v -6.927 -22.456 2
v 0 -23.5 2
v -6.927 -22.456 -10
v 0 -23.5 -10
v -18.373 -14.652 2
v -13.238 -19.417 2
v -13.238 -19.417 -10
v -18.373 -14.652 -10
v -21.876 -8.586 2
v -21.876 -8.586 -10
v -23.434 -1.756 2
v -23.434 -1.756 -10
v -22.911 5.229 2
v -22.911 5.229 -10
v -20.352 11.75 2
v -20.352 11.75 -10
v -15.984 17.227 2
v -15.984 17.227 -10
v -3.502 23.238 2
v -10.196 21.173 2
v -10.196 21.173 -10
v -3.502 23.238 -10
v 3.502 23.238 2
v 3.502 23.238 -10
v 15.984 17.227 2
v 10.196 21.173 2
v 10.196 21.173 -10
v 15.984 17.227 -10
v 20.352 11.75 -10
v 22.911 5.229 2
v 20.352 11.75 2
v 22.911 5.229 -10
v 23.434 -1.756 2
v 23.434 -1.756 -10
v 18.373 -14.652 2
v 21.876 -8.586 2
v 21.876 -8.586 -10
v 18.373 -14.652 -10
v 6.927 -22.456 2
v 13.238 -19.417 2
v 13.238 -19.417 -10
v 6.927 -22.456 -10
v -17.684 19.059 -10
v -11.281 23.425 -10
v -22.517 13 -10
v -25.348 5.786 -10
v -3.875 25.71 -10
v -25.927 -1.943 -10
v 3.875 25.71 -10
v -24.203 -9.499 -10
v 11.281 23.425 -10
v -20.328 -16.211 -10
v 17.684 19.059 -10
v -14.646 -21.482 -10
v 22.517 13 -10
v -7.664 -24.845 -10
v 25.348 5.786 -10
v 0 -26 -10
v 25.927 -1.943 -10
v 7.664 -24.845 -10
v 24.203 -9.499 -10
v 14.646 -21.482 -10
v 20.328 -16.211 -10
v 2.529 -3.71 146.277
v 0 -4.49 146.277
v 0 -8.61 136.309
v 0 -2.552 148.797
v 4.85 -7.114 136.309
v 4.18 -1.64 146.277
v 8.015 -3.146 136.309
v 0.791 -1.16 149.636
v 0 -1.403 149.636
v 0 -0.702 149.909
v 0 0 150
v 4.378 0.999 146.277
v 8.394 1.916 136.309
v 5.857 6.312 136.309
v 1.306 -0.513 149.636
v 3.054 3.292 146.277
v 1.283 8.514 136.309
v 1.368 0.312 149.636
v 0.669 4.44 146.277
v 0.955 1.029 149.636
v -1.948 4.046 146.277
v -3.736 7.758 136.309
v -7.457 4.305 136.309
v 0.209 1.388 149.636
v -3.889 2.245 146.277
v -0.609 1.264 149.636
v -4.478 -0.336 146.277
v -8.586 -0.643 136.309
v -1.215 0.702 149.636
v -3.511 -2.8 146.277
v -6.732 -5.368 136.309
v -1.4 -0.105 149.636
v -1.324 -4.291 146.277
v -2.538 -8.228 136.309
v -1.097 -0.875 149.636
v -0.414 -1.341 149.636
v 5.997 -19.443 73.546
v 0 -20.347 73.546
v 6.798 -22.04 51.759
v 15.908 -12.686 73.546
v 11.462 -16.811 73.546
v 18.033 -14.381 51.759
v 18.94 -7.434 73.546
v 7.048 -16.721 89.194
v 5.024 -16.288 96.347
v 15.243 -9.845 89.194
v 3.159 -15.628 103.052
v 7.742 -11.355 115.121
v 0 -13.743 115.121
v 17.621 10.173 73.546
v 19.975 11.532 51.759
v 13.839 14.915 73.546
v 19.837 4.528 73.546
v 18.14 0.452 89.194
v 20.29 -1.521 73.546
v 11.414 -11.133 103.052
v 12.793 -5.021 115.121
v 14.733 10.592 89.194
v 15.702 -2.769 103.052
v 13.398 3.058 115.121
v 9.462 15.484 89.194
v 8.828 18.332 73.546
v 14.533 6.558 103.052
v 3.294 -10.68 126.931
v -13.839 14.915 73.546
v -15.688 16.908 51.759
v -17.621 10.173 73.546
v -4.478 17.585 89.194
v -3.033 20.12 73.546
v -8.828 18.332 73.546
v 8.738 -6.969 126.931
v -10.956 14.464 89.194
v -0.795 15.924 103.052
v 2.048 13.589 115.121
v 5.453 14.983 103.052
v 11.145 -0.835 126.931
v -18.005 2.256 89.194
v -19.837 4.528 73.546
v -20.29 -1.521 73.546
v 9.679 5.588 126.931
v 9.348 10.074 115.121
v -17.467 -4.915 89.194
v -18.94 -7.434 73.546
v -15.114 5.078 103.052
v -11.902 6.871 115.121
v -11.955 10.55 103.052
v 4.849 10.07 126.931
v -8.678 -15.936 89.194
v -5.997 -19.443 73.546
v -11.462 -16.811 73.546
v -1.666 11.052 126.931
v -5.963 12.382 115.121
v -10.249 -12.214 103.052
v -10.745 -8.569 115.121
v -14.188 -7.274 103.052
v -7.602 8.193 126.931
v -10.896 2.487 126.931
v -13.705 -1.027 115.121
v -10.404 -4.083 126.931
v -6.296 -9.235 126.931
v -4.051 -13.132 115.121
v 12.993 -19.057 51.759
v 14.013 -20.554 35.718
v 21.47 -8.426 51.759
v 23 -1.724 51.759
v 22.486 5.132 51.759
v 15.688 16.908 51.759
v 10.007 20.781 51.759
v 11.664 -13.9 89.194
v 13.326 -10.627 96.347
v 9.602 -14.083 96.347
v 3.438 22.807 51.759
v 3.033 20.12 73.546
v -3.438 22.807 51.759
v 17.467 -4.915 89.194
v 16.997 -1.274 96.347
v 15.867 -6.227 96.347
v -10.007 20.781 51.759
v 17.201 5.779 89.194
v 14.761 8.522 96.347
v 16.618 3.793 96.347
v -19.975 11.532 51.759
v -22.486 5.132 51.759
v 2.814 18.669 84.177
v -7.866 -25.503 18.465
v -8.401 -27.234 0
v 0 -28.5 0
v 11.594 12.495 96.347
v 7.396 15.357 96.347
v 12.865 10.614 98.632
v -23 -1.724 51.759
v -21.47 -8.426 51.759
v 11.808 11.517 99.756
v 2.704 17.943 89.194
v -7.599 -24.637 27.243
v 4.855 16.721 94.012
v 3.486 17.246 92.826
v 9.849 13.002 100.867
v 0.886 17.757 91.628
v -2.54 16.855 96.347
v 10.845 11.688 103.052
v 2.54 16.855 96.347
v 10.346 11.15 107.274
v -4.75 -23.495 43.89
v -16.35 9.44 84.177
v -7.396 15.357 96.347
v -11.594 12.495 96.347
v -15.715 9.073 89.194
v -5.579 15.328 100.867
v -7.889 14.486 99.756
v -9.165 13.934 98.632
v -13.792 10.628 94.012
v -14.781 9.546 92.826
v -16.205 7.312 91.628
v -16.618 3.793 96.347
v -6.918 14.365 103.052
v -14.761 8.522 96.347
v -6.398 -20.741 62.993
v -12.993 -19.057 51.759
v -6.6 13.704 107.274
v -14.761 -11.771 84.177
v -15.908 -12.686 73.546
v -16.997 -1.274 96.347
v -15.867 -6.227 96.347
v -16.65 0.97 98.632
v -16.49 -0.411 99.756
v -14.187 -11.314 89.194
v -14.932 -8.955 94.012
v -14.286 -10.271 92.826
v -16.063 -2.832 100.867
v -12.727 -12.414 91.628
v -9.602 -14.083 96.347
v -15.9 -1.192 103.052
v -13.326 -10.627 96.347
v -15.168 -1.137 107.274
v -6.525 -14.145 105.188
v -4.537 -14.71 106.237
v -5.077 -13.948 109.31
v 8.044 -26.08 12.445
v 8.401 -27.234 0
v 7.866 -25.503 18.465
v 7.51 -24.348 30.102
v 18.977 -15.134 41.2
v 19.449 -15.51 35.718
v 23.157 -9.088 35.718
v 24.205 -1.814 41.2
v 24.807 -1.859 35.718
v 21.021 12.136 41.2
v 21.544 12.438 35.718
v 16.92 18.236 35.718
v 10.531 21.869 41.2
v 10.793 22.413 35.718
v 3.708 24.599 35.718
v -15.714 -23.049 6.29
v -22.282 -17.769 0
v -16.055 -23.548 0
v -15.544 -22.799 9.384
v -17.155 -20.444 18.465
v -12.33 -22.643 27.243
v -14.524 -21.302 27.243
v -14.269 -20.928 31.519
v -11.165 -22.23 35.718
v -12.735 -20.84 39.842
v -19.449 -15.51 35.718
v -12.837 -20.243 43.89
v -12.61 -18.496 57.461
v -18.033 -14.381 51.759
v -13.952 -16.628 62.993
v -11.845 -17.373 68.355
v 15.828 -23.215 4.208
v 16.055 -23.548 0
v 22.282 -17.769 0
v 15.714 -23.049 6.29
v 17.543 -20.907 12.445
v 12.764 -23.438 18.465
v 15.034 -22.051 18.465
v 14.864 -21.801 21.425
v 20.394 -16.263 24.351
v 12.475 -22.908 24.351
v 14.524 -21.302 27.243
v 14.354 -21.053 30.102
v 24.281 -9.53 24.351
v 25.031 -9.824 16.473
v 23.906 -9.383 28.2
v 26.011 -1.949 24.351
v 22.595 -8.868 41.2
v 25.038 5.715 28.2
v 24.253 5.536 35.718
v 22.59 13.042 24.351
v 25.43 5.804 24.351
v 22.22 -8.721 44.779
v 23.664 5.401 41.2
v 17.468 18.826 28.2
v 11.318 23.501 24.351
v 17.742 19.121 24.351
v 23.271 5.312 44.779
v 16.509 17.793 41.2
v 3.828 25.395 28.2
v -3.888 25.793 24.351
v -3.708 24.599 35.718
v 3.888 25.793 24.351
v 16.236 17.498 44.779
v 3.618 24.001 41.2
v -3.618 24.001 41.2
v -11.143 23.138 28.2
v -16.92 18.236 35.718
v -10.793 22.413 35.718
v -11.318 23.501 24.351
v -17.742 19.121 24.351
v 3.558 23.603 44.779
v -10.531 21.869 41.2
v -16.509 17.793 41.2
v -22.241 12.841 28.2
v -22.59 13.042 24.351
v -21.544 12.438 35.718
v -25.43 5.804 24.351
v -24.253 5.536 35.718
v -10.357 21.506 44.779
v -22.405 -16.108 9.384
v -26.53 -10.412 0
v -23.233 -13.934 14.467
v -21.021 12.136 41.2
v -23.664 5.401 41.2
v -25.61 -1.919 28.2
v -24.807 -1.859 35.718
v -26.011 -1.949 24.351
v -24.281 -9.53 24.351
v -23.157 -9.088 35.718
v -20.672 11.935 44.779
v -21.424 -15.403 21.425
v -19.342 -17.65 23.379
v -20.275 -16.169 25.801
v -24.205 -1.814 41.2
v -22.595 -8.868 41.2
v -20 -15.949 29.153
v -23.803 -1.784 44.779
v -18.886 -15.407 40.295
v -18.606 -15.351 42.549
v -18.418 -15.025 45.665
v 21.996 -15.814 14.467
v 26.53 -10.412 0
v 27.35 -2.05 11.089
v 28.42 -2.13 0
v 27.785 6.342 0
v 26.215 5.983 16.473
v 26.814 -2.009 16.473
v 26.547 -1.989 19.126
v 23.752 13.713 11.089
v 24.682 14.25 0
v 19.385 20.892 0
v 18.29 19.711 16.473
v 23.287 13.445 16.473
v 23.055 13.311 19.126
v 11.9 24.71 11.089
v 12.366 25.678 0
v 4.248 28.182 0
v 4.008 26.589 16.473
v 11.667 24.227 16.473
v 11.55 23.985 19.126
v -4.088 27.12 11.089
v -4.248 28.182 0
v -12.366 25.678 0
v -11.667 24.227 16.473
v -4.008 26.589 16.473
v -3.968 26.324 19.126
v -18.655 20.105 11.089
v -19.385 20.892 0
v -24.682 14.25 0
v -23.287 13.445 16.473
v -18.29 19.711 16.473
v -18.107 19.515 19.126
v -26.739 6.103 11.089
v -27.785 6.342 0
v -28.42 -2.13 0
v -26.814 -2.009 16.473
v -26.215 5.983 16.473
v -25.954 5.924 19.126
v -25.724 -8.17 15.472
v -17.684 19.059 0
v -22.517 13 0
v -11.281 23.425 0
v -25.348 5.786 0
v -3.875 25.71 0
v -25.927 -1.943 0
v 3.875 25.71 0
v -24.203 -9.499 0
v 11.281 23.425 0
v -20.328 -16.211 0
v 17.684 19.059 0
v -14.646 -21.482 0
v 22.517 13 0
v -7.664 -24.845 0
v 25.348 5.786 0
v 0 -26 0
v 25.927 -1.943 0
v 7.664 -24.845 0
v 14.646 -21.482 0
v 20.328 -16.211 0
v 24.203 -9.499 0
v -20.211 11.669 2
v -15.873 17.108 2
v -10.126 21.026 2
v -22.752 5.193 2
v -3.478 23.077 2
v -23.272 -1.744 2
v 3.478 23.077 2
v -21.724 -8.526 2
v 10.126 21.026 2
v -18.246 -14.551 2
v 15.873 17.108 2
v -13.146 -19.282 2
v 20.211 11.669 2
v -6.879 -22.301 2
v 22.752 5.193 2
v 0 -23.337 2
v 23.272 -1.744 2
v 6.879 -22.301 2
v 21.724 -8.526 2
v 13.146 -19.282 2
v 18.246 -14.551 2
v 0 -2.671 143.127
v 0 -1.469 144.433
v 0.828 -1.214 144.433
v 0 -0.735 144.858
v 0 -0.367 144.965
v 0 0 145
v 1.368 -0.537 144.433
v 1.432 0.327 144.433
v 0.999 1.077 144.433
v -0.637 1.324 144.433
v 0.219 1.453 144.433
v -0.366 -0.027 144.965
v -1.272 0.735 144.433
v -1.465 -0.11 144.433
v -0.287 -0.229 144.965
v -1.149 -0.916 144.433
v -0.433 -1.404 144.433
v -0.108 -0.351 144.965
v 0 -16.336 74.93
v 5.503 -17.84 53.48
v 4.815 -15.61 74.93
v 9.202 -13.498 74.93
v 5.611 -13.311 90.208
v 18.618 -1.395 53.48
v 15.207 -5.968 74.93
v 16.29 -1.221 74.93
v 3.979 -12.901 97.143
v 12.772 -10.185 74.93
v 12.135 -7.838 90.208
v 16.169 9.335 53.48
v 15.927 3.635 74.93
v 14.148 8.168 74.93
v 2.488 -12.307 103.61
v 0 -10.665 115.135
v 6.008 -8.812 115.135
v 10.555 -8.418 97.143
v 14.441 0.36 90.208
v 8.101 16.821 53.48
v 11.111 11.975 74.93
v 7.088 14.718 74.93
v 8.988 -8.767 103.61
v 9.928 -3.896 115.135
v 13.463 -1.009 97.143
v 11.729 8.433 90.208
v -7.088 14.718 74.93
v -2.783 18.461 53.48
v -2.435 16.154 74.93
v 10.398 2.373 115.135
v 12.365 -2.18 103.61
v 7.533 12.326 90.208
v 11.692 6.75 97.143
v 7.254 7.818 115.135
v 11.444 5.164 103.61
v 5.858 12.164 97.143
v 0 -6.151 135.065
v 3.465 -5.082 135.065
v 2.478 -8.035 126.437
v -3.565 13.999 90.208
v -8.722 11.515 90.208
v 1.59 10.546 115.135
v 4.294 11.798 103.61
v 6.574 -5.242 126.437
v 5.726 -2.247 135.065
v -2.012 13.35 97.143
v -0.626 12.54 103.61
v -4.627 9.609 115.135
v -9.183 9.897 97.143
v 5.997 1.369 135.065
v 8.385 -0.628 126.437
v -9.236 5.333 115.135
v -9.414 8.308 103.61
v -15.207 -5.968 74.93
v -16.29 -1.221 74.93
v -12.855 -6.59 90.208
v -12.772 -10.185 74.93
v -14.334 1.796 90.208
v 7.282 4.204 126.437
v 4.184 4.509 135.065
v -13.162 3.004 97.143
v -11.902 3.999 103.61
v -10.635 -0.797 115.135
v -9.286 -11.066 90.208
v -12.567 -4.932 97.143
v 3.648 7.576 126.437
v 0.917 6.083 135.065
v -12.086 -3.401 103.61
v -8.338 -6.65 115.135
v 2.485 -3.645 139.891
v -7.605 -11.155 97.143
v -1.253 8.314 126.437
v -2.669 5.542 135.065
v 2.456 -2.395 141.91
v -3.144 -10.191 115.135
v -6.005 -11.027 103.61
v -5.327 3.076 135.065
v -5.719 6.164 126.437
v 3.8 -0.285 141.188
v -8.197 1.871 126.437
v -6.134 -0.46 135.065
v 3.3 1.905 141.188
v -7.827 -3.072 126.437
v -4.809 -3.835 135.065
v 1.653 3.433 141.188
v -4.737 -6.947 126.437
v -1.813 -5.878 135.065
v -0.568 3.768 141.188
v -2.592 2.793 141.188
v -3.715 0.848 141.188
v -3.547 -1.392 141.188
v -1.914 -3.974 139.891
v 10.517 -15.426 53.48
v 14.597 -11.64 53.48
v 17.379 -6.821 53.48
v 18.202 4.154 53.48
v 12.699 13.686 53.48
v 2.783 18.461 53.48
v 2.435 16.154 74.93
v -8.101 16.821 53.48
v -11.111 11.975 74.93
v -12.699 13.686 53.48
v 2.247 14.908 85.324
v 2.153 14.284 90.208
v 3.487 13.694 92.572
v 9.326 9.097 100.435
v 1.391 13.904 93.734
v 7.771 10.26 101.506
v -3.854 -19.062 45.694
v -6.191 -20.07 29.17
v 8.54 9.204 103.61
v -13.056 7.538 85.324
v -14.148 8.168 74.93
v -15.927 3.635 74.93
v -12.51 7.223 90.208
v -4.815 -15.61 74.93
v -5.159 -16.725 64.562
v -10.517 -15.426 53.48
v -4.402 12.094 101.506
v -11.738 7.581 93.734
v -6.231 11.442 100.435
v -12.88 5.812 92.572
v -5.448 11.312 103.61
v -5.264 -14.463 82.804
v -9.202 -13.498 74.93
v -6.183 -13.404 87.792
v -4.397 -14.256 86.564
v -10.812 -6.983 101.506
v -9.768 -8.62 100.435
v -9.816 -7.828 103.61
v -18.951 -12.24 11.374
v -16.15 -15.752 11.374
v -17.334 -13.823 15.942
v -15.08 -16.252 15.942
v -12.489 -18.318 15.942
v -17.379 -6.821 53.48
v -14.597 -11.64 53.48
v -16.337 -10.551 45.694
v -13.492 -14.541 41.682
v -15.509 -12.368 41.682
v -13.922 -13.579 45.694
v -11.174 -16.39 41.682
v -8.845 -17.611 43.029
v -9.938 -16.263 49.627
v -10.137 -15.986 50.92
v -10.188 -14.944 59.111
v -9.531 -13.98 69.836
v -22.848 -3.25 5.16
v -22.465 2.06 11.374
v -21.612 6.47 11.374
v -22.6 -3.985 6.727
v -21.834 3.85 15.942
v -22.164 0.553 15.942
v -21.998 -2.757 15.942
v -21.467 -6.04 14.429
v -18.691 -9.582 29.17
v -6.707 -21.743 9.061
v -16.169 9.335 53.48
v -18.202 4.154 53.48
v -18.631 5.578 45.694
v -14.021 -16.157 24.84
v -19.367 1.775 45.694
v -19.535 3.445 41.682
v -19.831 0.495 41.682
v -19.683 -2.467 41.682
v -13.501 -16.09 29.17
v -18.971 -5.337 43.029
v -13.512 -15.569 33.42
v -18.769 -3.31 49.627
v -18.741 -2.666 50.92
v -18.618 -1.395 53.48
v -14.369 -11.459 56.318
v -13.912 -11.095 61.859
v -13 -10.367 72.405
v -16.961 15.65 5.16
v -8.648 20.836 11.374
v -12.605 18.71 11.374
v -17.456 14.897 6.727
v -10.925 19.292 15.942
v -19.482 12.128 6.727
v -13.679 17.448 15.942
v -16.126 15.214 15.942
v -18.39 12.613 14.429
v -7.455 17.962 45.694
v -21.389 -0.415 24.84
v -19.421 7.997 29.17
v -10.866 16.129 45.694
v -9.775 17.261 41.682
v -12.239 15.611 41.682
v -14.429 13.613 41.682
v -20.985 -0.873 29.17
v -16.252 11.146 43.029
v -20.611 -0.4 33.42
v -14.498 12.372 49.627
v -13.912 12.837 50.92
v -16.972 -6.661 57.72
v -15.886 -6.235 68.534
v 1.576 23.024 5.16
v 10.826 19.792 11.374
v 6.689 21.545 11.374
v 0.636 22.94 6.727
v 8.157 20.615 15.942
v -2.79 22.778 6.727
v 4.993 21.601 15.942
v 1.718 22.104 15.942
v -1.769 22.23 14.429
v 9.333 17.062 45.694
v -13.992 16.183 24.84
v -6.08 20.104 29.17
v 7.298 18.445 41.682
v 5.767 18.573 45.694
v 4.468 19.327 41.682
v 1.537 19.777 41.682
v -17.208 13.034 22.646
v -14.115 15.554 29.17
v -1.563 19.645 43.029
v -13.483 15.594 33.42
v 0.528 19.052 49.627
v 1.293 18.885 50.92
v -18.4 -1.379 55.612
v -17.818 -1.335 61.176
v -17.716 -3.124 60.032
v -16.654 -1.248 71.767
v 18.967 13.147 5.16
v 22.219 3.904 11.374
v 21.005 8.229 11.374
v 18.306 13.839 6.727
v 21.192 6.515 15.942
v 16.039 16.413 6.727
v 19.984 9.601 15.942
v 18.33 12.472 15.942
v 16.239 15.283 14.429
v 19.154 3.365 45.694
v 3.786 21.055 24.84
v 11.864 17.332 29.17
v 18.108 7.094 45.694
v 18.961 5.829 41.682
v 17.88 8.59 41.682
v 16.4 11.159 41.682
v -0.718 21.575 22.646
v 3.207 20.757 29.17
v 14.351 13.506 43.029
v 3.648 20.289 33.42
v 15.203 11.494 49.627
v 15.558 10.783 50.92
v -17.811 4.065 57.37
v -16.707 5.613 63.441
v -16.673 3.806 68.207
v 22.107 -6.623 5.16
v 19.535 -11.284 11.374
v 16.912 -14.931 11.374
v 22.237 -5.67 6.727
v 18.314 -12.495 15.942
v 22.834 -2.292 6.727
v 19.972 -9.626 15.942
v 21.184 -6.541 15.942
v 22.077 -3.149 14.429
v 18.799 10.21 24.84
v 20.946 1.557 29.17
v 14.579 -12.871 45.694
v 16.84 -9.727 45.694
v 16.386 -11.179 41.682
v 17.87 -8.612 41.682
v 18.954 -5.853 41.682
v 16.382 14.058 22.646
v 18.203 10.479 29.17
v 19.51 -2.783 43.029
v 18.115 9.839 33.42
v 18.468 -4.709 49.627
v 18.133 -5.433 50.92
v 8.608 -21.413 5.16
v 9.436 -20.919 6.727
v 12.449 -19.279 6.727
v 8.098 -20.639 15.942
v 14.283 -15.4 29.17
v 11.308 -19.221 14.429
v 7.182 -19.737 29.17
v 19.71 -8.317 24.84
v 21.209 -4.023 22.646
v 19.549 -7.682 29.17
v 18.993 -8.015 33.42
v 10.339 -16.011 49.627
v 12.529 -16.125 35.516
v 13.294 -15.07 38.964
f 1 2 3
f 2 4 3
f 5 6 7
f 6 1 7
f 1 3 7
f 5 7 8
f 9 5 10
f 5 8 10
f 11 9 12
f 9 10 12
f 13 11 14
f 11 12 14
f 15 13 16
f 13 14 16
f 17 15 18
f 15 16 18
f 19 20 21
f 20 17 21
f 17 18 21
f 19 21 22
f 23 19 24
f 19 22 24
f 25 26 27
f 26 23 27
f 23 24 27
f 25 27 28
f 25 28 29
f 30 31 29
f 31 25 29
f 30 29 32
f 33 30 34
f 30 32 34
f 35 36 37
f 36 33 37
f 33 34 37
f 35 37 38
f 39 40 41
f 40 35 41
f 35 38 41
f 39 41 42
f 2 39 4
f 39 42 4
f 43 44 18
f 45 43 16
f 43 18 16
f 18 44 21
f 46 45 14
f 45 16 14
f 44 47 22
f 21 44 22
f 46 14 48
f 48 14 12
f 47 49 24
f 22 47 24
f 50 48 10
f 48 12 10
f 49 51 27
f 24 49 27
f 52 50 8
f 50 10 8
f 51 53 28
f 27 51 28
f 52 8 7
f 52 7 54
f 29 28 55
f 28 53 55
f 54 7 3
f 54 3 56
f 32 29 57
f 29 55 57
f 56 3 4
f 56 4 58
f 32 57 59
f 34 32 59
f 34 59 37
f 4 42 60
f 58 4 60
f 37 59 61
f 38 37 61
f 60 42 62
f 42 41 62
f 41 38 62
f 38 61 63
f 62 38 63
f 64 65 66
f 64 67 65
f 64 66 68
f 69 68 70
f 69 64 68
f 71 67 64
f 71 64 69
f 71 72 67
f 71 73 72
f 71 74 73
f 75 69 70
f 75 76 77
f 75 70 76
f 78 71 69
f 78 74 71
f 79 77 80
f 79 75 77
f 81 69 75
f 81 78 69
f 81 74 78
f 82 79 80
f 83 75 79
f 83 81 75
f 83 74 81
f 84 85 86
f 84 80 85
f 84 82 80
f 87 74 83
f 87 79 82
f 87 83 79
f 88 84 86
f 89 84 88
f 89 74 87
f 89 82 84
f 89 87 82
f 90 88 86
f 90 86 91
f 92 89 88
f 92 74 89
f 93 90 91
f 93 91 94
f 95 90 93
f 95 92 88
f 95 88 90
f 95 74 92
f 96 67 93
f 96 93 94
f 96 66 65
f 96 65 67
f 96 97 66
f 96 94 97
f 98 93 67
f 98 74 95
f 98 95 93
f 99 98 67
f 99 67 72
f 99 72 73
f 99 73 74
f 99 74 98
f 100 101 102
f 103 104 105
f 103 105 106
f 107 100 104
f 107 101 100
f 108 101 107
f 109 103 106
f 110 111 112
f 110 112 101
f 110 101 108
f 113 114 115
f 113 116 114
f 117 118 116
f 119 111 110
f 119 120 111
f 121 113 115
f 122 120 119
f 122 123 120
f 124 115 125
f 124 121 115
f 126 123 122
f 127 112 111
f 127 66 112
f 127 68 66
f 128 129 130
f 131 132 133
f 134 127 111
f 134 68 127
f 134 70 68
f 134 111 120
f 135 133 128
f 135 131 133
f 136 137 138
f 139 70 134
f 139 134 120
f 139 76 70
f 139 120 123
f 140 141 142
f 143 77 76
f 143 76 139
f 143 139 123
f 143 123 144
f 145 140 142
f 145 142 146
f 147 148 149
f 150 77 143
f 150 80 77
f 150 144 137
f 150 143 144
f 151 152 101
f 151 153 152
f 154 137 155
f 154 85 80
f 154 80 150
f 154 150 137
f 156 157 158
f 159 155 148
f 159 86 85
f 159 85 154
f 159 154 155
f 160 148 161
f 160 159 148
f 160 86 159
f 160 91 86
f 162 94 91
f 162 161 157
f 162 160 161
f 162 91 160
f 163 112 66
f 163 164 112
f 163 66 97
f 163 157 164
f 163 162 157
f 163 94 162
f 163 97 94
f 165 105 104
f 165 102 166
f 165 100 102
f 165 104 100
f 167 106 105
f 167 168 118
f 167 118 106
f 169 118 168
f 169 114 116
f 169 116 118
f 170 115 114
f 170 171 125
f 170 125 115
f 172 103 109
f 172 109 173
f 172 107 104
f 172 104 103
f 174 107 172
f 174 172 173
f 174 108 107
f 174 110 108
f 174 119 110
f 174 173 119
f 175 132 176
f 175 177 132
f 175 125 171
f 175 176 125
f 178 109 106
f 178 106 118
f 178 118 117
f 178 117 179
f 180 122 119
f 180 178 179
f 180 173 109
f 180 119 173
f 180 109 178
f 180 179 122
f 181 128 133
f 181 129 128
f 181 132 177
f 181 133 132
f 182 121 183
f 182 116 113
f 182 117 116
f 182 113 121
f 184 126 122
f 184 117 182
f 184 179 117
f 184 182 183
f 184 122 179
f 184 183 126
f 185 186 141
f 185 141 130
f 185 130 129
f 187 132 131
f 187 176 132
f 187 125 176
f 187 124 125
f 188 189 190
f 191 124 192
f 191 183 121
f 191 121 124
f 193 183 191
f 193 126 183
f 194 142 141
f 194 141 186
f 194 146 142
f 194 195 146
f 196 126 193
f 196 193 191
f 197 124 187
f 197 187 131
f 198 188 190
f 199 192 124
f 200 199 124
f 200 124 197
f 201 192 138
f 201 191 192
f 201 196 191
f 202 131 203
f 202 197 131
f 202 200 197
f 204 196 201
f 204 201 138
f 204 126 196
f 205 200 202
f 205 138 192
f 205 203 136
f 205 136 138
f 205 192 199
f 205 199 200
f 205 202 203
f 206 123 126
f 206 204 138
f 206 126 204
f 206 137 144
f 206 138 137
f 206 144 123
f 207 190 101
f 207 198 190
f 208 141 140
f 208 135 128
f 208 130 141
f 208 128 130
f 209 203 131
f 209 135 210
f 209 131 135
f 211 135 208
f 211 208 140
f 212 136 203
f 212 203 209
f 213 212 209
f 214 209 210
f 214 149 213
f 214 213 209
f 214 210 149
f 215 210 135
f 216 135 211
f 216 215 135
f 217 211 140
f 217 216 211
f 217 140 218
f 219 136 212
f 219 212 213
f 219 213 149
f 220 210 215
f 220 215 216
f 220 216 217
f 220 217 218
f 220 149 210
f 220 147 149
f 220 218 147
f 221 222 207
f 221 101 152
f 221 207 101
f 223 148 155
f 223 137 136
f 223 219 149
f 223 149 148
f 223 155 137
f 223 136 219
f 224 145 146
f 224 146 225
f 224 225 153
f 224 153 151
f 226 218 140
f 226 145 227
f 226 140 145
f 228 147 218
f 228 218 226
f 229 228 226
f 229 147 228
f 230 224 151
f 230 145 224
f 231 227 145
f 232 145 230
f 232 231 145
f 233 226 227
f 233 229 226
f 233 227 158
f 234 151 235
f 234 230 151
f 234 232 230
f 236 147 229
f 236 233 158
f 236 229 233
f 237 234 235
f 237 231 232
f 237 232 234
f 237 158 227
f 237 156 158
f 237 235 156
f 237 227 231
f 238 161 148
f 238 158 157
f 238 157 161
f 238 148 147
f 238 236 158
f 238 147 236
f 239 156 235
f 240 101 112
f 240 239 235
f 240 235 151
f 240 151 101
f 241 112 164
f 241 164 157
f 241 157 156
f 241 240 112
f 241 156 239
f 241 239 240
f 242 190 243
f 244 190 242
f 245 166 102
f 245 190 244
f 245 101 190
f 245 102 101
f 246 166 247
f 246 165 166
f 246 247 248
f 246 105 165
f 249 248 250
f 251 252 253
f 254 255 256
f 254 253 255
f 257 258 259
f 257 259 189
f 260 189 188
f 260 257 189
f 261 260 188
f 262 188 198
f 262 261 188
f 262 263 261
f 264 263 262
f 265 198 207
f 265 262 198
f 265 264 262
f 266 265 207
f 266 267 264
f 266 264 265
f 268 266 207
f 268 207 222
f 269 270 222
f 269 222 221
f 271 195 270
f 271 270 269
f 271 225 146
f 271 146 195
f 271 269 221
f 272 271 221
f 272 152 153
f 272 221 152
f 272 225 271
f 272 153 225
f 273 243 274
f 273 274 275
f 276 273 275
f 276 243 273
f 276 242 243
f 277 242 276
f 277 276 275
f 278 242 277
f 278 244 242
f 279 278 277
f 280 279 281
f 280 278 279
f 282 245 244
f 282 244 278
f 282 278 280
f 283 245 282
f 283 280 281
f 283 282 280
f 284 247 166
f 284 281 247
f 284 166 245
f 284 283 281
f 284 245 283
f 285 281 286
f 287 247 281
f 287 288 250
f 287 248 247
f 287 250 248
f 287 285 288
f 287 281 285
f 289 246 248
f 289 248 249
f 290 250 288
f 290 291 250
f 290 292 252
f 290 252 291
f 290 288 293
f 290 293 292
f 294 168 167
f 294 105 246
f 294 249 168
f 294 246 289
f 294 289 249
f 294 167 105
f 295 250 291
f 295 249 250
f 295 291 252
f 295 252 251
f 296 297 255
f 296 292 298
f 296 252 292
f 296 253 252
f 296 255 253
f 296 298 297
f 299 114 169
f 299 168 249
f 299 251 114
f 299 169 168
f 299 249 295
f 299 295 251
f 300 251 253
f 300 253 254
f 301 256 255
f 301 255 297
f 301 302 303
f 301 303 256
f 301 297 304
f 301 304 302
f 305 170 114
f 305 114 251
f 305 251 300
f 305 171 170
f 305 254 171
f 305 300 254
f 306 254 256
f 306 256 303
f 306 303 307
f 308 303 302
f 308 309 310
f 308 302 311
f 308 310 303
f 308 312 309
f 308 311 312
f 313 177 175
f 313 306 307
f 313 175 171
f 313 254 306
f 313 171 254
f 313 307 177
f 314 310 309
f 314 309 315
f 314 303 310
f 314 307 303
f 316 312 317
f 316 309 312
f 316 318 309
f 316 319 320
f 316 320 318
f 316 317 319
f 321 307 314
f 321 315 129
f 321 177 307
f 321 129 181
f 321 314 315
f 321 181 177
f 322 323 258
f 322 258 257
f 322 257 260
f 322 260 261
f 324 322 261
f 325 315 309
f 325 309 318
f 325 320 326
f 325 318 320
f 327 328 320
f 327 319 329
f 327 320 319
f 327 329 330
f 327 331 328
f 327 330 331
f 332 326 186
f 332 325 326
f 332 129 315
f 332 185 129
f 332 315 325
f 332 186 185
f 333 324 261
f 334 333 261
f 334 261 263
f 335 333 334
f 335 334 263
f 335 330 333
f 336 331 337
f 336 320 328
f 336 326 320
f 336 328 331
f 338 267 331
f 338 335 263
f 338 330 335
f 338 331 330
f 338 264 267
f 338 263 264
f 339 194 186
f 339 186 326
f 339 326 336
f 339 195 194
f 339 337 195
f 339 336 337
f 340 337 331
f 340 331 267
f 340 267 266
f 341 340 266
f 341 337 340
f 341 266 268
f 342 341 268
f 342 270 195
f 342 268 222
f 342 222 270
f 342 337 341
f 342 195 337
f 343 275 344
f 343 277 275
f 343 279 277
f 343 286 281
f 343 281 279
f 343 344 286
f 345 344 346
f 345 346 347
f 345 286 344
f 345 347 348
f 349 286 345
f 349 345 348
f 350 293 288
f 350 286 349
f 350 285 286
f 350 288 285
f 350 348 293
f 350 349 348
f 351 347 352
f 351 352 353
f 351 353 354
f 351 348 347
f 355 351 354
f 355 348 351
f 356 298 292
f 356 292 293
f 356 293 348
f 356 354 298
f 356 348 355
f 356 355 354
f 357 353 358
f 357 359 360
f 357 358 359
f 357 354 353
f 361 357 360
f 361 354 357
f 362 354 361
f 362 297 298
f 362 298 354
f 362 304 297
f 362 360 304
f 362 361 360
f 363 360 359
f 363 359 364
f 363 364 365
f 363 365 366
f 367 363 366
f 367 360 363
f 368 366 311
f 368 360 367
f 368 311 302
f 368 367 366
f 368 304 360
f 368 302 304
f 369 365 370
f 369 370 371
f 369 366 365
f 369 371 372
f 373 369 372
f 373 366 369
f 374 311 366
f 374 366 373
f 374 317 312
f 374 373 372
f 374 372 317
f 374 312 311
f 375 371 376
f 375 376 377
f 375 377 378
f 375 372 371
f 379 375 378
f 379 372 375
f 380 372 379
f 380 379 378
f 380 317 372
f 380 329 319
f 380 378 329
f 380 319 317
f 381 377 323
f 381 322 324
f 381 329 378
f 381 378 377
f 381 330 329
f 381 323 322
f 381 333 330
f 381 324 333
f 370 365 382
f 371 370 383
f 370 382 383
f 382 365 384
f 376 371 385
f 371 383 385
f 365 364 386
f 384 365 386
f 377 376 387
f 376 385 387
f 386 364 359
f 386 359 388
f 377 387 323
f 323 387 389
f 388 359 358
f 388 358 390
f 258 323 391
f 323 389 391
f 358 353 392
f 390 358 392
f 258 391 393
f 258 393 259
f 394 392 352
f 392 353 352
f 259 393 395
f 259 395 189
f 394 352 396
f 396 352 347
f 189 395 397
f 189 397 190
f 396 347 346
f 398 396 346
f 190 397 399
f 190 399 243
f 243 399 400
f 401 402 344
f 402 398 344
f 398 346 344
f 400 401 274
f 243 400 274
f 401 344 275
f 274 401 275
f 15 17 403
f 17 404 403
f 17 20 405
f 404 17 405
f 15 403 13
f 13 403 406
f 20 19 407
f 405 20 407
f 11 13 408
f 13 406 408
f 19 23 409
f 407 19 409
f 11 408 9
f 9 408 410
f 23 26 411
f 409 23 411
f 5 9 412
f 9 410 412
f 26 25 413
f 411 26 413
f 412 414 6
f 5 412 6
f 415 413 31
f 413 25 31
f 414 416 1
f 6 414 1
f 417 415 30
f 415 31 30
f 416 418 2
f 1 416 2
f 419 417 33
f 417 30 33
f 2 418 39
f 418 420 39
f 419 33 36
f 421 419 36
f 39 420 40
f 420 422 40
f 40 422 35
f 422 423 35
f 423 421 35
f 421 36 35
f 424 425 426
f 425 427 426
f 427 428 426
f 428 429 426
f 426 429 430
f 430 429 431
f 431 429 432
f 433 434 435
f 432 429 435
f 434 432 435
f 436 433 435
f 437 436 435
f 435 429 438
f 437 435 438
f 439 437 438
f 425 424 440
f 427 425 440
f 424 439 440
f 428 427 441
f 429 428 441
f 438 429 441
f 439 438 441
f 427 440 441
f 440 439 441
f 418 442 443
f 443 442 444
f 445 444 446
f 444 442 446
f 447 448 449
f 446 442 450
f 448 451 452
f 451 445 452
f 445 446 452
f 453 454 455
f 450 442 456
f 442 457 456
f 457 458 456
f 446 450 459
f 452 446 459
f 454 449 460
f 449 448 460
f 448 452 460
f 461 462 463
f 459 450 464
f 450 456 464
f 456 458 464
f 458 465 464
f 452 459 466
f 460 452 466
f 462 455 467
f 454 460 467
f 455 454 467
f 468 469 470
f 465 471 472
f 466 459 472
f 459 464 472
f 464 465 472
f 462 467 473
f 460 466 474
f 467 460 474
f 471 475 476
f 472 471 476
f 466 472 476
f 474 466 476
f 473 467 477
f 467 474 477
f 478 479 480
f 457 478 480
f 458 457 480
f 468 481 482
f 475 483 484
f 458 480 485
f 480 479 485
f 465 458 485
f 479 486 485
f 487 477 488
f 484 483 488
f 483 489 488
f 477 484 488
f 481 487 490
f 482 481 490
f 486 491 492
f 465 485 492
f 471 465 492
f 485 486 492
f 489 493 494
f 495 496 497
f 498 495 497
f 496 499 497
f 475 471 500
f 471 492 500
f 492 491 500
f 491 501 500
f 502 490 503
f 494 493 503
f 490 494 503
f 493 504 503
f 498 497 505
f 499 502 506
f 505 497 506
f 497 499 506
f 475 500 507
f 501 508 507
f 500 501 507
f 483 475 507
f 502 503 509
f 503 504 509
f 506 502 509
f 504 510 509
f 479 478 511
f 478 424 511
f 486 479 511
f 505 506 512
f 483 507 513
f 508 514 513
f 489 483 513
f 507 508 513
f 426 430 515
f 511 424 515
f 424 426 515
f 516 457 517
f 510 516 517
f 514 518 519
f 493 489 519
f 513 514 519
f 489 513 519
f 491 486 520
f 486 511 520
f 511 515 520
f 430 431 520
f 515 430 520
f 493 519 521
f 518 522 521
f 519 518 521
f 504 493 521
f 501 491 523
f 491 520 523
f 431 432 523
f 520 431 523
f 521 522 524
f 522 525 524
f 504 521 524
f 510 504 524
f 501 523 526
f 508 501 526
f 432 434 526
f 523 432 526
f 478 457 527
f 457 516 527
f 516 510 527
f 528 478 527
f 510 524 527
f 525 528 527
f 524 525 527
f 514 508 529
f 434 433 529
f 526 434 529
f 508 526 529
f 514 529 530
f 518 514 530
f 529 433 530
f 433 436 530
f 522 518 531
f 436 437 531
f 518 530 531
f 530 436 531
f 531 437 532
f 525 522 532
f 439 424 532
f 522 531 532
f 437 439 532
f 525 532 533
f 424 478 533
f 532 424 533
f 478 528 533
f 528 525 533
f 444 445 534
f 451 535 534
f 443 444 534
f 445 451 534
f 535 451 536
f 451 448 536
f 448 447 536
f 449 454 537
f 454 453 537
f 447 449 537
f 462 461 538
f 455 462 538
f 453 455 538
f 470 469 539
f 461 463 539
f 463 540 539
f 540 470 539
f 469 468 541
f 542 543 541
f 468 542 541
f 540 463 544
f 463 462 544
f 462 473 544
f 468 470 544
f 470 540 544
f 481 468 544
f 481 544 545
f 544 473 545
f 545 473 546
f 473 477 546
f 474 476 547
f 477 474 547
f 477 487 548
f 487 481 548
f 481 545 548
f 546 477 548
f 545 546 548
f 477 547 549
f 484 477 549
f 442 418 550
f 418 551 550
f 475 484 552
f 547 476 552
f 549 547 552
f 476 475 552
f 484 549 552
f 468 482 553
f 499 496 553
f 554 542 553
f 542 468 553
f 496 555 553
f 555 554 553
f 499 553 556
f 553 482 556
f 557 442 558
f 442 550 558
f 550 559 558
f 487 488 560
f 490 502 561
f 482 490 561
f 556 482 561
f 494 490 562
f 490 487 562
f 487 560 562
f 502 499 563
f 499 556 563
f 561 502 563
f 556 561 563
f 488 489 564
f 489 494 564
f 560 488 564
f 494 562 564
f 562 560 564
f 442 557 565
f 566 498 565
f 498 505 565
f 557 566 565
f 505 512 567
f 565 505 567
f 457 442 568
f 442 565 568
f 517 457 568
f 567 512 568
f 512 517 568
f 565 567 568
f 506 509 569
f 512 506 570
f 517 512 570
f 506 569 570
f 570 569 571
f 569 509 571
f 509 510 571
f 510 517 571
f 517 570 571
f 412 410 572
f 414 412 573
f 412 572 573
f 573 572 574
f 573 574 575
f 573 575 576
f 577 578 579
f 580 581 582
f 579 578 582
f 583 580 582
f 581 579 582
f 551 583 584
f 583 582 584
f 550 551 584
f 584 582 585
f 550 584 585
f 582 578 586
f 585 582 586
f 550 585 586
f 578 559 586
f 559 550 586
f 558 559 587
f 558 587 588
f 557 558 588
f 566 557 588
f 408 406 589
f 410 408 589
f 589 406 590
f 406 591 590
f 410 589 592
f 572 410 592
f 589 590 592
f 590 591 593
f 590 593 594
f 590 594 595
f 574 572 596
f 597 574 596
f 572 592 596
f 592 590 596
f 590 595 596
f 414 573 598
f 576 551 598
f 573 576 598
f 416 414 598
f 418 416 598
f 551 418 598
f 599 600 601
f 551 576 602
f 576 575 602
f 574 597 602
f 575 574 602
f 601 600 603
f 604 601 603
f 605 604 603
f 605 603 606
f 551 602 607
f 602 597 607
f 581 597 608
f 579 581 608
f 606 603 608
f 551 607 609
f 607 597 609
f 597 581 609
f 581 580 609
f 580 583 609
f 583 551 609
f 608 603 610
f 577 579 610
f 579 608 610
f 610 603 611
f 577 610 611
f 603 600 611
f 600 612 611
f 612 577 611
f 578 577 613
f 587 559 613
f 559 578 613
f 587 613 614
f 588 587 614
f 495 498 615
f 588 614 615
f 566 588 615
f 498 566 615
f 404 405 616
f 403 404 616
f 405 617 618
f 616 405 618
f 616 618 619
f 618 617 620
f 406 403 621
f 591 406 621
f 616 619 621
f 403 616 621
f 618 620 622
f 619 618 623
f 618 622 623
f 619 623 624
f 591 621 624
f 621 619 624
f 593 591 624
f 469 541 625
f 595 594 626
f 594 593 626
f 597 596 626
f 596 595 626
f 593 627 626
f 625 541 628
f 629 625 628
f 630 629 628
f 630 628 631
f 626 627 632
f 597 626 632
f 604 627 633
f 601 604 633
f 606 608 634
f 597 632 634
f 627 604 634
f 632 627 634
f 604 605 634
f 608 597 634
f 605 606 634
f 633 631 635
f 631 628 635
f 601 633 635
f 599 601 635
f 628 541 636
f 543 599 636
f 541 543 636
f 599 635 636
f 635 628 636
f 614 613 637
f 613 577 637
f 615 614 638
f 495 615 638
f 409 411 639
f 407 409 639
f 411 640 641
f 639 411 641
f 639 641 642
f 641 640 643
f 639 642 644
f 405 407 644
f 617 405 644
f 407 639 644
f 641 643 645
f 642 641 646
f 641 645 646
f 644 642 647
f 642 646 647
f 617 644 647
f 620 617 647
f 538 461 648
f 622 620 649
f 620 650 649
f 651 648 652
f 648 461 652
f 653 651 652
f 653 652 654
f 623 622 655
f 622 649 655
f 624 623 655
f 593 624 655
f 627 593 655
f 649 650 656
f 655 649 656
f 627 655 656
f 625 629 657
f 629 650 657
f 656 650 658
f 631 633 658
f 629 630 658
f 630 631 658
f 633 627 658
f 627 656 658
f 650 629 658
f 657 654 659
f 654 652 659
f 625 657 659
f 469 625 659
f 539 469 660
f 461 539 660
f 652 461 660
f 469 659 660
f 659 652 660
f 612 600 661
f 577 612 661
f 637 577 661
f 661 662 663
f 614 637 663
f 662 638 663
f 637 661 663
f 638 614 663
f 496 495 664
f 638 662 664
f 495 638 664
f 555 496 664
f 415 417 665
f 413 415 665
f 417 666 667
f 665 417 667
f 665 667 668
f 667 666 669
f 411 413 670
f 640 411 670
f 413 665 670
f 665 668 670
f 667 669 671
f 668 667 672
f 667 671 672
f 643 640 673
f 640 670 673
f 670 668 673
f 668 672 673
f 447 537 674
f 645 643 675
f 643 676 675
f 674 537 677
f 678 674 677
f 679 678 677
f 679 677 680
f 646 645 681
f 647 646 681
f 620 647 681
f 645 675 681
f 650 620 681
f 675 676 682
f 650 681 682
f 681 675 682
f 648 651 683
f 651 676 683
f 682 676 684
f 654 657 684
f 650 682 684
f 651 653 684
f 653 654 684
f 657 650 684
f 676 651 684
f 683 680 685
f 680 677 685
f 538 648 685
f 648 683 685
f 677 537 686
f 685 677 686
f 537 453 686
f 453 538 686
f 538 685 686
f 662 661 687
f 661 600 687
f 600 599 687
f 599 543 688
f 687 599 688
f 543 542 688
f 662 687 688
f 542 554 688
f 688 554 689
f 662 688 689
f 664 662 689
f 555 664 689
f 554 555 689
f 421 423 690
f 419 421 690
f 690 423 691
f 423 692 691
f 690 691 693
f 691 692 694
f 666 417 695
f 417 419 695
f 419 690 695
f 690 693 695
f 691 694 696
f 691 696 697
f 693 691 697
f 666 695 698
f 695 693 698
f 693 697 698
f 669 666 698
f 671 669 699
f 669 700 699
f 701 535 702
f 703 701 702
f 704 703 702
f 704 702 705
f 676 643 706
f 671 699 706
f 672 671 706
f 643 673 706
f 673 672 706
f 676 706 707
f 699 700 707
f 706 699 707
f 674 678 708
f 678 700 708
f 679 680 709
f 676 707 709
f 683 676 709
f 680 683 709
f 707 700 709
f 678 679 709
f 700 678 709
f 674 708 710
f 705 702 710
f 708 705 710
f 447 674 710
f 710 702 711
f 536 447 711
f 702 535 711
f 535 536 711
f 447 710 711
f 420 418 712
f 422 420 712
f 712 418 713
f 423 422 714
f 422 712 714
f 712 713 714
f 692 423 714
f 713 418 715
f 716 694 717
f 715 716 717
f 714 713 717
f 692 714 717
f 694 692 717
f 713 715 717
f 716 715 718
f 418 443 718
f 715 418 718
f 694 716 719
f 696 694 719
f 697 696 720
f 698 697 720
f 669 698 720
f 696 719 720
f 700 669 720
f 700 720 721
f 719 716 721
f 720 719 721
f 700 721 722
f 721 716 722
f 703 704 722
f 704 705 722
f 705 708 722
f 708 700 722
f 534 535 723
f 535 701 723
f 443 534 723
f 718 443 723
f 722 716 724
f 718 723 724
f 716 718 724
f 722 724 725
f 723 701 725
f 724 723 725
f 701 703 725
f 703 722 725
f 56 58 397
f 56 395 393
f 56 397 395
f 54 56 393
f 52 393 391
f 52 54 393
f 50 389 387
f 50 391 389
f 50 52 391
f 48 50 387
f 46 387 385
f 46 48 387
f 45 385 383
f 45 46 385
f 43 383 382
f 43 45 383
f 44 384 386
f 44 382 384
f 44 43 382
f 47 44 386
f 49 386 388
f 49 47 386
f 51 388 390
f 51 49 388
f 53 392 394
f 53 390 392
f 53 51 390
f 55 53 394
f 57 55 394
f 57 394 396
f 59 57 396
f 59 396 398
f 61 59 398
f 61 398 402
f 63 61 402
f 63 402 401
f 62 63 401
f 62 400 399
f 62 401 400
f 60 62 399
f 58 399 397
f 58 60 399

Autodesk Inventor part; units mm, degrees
ref_plane "YZ Plane" through (0, 0, 0) normal (1, 0, 0) x (0, 1, 0)
ref_plane "XZ Plane" through (0, 0, 0) normal (0, 1, 0) x (-1, 0, 0)
ref_plane "XY Plane" through (0, 0, 0) normal (0, 0, 1) x (1, 0, 0)
sketch "Sketch2" plane through (0, 0, 0) normal (1, 0, 0) x (0, 1, 0)
  line L0 (0, 0) -> (26, 0)
  line L1 (26, 0) -> (26, -10)
  line L2 (0, 2) -> (23.5, 2)
  line L3 (0, 0) -> (-26, 0)
  line L4 (-26, 0) -> (-26, -10)
  line L5 (0, 2) -> (-23.5, 2)
  line L6 (0, 0) -> (0, 212.5)
  line L7 (0, 0) -> (0, 150)
  line L8 (23.5, 2) -> (23.5, 0)
  line L9 (-23.5, 2) -> (-23.5, 0)
  line L10 (0, 0) -> (0, 145)
  spline S0 degree 2 poles (28.5, 0) (0, 300) (-28.5, 0) knots 0 0 0 1 1 1
  spline S1 degree 2 poles (23.5, 0) (0, 290) (-23.5, 0) knots 0 0 0 1 1 1
  line L11 (0, 2) -> (-7.0238, 2)
  line L12 (0, 172) -> (0, 2)
  line L13 (0, 0) -> (-5, 0)
  line L14 (0, 212.5) -> (0, 0)
  line L15 (-7.0238, 2) -> (-15.0238, 2)
  line L16 (-23.5, 2) -> (-28.3094, 2)
  line L17 (0, -54.5) -> (0, 257) projected
  line L18 (23.5, 0) -> (23.5, -10)
  line L19 (23.5, -10) -> (26, -10)
  line L20 (-23.5, 0) -> (-23.5, -10)
  line L21 (-23.5, -10) -> (-26, -10)
  line L22 (28.5, 0) -> (26, 0)
  line L23 (-26, 0) -> (-28.5, 0)
  point P0 (0.3832, 149.9729)
  point P1 (28.3225, 1.8623)
  point P2 (23.3374, 2)
  point P3 (0, 2)
  point P4 (3, 2)
  point P5 (-23.3374, 2)
  dimension "d51" = 26
  dimension "d54" = 2
  dimension "d55" = 26
  dimension "d59" = 150
  dimension "d60" = 23.5
  dimension "d61" = 23.5
  dimension "d62" = 145
  dimension "d64" = 23.5
  dimension "d80" = 5
  dimension "d81" = 10
  dimension "d82" = 5
  dimension "d83" = 10
revolve "Revolution5" add sketch "Sketch2" angle 360 mid plane about axis through (0, 0, -10) along (0, 0, 1) contours L8 L2 S1 L6 S0 L22 L0 | L0 L1 L19 L18
properties part number "nose-basepart1" material "ABS Plastic"
